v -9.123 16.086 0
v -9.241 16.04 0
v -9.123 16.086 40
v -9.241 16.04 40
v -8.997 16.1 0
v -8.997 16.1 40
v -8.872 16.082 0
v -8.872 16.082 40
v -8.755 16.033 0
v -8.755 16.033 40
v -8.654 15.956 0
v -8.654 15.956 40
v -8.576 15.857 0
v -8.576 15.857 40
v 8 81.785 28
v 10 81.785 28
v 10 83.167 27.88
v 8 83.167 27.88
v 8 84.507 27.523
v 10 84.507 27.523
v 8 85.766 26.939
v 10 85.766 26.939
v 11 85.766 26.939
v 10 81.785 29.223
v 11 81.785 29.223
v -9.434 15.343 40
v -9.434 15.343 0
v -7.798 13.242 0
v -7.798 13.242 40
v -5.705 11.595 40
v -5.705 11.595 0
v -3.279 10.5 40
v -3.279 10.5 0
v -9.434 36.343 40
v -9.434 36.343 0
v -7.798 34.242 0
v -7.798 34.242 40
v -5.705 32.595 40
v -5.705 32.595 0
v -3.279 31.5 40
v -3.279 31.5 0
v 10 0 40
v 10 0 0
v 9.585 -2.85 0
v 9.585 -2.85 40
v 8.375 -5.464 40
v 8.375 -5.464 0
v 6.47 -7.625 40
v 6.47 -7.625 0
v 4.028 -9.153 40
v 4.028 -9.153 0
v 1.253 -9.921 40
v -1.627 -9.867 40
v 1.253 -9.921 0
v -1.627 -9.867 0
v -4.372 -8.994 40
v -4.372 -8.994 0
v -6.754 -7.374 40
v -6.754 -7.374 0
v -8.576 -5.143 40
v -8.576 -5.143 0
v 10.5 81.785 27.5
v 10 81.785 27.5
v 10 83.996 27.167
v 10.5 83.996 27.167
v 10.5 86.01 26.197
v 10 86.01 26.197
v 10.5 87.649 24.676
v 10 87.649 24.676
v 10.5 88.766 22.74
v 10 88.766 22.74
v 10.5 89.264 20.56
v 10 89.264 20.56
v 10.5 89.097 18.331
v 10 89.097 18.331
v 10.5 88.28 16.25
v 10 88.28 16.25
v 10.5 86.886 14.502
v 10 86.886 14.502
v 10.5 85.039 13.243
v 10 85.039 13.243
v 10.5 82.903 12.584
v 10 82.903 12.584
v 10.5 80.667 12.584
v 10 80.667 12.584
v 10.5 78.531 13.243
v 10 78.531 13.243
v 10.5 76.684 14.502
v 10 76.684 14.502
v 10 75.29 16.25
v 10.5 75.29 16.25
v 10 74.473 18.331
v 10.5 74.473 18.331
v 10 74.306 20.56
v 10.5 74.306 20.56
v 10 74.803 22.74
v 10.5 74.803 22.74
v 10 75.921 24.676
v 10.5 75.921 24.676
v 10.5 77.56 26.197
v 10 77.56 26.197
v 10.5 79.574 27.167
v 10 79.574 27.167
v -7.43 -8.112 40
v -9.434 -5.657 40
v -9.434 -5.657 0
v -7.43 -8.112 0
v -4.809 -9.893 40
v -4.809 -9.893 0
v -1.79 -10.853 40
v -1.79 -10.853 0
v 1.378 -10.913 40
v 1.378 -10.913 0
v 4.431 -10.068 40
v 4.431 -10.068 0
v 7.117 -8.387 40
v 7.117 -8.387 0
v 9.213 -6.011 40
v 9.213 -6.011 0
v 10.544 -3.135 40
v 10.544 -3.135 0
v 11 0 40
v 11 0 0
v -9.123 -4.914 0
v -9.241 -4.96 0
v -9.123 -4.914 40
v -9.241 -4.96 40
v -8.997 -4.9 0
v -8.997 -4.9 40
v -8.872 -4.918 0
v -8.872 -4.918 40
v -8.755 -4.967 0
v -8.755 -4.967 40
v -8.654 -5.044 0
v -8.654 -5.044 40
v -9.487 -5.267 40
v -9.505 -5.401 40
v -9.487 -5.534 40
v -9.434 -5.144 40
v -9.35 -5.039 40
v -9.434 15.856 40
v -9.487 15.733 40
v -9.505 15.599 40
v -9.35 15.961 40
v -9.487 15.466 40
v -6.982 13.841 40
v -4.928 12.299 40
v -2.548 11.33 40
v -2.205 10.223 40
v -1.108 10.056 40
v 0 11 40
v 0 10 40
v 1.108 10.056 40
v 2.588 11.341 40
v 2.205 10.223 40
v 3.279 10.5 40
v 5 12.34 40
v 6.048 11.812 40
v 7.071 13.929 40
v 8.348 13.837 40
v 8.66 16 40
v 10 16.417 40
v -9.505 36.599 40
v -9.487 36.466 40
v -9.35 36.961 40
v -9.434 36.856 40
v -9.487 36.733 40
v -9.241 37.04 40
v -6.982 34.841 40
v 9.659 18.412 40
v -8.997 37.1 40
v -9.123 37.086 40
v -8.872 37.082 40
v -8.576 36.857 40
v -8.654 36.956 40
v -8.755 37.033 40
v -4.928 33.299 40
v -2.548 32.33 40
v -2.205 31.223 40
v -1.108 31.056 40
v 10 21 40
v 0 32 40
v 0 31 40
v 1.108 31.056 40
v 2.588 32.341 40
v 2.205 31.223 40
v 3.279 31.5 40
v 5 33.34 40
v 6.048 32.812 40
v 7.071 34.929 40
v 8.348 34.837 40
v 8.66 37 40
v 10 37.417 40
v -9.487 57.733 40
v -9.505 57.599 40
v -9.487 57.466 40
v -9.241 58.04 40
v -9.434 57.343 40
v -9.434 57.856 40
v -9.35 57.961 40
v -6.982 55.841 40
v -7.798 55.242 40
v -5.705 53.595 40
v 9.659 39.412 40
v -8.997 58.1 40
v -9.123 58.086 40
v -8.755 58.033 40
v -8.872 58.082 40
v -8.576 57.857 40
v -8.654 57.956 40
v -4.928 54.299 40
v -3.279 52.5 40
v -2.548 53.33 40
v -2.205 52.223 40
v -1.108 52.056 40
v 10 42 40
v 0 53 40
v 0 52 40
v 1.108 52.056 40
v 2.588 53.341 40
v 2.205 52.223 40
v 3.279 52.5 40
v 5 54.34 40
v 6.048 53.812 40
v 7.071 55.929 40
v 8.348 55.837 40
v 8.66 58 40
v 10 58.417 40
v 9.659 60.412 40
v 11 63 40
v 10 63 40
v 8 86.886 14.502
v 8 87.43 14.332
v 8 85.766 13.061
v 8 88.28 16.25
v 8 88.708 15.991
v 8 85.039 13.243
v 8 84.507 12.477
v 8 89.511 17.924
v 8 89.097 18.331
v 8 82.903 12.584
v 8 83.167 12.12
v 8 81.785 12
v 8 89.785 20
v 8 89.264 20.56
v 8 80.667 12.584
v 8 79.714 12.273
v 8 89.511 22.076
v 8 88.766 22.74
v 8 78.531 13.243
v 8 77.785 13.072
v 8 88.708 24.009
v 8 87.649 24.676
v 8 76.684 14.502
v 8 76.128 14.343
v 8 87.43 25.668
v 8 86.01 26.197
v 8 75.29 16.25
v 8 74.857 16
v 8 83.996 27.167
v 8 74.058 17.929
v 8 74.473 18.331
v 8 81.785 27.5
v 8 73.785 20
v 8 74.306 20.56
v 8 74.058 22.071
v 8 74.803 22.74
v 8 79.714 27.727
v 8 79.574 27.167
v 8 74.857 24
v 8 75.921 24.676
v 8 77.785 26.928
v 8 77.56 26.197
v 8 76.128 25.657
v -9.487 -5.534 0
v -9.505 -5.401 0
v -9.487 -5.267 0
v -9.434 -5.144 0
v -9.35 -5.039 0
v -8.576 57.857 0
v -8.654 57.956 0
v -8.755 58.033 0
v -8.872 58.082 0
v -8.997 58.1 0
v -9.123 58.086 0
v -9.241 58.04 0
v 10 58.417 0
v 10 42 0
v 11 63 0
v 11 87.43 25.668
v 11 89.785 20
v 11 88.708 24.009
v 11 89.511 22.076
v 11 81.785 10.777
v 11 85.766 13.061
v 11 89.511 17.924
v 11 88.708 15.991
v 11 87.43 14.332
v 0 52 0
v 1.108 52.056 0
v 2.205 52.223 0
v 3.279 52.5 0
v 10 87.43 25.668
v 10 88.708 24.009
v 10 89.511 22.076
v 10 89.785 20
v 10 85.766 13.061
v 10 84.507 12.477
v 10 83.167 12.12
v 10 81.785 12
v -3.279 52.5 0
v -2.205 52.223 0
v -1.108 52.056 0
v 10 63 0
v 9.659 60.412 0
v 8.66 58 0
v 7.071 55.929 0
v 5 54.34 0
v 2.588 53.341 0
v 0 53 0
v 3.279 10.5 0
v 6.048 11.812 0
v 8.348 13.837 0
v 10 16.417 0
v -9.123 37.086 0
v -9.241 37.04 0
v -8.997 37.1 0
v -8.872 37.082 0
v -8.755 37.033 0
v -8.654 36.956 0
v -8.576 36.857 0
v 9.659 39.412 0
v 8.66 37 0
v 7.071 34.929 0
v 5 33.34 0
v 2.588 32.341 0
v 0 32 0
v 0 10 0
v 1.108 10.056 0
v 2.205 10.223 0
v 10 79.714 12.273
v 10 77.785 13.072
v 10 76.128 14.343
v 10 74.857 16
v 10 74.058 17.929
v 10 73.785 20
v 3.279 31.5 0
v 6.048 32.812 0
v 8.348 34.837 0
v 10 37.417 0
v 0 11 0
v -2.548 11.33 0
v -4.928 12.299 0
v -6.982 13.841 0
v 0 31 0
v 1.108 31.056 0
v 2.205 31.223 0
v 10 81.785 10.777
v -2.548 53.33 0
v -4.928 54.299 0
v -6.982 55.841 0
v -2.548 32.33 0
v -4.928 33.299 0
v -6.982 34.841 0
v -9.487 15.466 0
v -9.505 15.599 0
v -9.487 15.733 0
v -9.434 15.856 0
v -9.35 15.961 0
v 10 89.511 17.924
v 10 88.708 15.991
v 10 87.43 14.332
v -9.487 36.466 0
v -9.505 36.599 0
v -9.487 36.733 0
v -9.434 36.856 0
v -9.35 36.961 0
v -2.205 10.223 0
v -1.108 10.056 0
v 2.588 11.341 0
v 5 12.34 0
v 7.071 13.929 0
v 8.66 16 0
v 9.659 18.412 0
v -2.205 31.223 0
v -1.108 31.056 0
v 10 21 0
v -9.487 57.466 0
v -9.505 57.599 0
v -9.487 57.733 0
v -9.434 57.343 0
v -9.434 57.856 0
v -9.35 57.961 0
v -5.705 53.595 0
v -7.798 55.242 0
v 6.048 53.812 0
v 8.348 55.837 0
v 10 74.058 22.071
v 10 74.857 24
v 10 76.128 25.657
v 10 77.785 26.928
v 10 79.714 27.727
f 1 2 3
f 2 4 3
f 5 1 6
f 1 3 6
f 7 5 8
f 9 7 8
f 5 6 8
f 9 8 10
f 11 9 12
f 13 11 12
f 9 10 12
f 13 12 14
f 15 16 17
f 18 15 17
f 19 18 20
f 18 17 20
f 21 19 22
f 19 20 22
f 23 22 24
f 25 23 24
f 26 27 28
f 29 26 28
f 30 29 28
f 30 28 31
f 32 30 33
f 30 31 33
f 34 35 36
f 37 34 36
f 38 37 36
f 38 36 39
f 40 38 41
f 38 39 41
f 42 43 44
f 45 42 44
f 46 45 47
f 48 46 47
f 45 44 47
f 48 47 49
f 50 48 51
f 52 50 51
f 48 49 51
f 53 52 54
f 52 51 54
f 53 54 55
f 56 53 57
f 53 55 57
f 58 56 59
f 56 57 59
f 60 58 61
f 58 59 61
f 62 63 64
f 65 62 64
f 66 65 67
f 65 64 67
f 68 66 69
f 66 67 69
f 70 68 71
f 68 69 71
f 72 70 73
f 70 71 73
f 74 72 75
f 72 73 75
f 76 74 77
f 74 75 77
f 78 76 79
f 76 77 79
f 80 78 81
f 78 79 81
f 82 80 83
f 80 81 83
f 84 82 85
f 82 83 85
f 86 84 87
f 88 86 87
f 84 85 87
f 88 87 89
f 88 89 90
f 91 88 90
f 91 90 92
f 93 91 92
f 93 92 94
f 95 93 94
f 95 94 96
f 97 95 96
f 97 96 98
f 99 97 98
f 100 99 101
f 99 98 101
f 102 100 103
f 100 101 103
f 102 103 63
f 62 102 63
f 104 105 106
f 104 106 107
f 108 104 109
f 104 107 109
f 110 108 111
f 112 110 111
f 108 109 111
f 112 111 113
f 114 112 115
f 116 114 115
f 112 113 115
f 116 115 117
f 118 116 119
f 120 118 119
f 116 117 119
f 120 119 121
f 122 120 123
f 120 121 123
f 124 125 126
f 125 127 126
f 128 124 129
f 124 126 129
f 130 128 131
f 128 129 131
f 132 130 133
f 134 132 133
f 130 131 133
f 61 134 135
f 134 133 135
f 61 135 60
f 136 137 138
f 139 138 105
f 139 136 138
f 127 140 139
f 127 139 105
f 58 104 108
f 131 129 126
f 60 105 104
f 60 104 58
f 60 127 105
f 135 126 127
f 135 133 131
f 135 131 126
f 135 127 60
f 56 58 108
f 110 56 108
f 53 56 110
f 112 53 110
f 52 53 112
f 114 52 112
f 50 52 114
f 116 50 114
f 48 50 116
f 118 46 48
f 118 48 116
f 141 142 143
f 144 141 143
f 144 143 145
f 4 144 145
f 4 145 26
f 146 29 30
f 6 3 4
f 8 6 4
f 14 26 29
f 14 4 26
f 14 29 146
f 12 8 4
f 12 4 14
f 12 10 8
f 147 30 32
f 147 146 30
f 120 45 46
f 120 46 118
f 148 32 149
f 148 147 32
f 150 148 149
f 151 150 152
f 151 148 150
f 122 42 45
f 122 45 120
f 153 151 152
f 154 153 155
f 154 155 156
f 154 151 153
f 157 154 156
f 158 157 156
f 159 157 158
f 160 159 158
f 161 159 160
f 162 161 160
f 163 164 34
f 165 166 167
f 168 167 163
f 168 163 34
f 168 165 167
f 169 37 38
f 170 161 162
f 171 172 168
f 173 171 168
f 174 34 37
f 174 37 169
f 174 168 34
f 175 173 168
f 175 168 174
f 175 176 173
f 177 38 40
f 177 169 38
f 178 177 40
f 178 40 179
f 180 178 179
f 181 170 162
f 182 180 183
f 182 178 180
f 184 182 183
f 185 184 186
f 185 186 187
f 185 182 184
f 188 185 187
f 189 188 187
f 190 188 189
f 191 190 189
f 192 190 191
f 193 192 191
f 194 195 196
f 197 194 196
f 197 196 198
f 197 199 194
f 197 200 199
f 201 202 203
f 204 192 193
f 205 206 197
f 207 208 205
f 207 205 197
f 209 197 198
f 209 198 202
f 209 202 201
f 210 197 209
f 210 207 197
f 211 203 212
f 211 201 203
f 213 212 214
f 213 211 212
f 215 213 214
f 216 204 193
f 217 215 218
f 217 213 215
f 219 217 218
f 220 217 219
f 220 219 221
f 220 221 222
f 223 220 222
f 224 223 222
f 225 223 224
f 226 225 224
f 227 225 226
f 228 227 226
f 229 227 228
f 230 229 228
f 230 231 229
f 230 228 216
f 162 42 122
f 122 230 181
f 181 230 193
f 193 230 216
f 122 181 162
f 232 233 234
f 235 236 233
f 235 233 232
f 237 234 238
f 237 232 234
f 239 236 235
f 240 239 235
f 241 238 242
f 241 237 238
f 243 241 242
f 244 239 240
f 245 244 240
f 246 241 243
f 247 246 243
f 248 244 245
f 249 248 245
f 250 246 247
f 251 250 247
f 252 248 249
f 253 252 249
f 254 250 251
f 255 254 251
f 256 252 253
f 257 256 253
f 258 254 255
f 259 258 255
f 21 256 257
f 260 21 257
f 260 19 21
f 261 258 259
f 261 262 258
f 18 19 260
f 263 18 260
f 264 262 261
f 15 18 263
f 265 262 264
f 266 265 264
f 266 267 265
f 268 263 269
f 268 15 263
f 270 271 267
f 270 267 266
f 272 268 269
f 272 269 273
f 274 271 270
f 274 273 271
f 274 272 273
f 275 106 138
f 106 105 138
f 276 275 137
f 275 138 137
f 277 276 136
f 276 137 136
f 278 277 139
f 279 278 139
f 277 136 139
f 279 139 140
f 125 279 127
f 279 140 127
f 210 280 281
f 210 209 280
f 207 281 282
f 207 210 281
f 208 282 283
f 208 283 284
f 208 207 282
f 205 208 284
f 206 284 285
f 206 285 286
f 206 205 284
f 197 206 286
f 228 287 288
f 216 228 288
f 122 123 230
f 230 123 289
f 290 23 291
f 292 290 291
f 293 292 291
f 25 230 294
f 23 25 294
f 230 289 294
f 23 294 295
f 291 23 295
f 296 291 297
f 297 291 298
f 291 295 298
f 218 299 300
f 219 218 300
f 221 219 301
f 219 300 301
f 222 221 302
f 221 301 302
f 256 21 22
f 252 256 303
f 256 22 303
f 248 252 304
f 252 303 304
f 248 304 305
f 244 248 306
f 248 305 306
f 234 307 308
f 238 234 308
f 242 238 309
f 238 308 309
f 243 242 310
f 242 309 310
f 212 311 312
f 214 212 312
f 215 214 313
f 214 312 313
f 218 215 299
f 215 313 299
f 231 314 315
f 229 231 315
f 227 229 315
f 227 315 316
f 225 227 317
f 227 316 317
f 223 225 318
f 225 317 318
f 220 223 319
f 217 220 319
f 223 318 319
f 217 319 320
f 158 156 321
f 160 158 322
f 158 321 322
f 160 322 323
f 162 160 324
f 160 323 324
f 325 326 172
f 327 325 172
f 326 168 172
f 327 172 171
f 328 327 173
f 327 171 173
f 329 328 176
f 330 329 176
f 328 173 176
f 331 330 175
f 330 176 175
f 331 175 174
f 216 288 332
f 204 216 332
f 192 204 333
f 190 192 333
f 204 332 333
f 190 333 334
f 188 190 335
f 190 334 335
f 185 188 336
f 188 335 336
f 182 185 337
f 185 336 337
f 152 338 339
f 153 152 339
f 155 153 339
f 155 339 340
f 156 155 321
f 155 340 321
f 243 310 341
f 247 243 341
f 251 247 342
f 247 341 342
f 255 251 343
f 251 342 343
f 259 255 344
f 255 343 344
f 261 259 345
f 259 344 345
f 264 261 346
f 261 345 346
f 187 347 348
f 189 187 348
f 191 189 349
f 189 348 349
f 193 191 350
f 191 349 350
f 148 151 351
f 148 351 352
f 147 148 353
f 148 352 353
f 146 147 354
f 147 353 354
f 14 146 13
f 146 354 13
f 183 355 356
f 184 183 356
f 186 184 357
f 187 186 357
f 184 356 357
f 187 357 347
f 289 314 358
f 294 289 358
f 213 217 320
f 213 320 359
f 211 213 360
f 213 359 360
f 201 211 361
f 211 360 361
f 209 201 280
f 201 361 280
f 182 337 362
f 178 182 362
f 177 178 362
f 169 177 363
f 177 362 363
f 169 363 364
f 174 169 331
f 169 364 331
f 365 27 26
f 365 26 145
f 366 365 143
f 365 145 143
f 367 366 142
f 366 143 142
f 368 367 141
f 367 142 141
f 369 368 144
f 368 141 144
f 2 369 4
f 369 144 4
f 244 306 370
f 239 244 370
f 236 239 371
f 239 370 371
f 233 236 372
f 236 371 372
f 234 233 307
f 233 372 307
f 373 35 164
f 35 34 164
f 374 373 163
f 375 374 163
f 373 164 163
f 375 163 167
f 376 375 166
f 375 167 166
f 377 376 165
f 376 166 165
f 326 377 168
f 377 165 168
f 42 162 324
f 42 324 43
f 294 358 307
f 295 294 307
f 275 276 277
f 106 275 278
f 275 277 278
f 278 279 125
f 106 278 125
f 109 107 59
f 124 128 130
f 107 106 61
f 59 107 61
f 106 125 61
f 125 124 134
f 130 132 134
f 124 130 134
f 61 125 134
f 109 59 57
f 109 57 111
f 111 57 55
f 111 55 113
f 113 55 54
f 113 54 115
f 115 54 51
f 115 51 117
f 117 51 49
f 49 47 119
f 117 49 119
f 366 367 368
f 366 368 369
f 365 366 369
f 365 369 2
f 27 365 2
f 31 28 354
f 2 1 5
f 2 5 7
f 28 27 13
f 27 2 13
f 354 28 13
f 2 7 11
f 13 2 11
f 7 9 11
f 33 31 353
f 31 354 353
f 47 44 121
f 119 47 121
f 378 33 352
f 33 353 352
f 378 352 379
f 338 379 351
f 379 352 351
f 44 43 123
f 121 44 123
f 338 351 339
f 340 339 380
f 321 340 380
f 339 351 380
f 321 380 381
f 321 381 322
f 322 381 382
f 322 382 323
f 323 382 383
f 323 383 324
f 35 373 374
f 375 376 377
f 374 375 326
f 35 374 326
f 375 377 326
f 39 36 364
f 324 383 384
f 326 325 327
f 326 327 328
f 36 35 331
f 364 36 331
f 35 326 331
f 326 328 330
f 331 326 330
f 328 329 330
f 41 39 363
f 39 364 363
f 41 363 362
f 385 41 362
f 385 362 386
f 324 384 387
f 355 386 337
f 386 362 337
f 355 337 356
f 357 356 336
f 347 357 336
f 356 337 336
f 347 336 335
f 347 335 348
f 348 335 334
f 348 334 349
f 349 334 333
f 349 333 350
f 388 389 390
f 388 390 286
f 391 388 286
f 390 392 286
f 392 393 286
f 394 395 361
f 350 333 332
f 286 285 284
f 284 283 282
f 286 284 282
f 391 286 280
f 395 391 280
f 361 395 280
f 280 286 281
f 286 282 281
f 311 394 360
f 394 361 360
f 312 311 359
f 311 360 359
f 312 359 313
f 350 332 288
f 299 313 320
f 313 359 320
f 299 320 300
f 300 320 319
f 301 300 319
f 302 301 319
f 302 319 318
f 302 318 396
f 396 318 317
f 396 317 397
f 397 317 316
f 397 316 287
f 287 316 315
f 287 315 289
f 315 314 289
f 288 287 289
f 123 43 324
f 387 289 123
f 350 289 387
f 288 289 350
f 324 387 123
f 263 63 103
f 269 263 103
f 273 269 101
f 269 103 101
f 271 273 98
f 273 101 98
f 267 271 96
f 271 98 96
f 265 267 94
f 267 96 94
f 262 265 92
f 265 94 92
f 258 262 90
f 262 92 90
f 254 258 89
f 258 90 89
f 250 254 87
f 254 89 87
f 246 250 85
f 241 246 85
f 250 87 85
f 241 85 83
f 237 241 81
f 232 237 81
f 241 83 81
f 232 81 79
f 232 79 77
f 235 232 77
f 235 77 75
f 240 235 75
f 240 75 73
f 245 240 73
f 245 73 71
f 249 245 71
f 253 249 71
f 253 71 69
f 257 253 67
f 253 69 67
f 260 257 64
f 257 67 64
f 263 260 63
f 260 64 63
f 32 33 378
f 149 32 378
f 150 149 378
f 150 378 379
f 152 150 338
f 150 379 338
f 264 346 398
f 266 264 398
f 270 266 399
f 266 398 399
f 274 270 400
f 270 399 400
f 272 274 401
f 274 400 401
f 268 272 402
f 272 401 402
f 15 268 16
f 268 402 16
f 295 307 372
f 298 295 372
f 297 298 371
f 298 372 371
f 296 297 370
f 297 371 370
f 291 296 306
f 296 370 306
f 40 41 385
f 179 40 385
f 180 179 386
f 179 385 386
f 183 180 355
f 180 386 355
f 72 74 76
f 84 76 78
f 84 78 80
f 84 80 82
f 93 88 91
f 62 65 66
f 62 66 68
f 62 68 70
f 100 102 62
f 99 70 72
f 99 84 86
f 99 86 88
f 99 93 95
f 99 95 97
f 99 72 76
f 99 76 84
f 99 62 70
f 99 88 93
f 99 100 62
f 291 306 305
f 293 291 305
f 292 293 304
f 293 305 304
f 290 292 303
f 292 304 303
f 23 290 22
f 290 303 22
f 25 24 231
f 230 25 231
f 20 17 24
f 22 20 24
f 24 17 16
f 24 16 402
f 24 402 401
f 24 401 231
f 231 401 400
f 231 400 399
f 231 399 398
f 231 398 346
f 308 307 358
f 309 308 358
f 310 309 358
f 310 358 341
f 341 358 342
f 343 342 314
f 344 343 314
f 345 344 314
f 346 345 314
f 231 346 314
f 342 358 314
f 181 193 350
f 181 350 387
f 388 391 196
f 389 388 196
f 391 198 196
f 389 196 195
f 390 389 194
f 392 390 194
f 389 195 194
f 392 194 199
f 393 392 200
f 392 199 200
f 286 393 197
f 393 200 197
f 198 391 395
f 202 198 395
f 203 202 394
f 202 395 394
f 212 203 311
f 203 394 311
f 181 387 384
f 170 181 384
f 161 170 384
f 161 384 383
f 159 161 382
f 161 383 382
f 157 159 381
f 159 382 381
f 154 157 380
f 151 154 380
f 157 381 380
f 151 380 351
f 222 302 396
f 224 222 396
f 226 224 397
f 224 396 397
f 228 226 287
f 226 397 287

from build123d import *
from build123d import SkipClean  # not in build123d's __all__

# Parameters (mm, degrees)
F1_DEPTH = 40
F3_DEPTH = 1.001
F4_DEPTH = 2
F5_DEPTH = 0.5
F6_R     = 0.49999


# Not quite as in the source:
# - a fillet or chamfer is up to 0.001 mm smaller than in the source, because OpenCascade refuses the exact size


with BuildPart() as f1:
    # F0 (on Top) → F1 (new body)
    with BuildSketch(Plane.XY):
        with BuildLine():
            Line((11, 0), (10, 0))
            ThreePointArc((10, 0), (2.4380397486, -9.6982453147), (-8.8111924369, -4.7289415137))
            Line((-8.8111924369, -4.7289415137), (-9.6923116806, -5.2018356651))
            ThreePointArc((-9.6923116806, -5.2018356651), (2.6818437234, -10.6680698462), (11, 0))
        make_face()
        with BuildLine():
            Line((10, 4.582575695), (10, 0))
            Line((10, 0), (11, 0))
            ThreePointArc((11, 0), (10.7470926301, 2.3452078799), (10, 4.582575695))
        make_face()
        with BuildLine():
            Line((10, 16.417424305), (10, 4.582575695))
            ThreePointArc((10, 4.582575695), (10.7470926301, 2.3452078799), (11, 0))
            Line((11, 0), (11, 21))
            ThreePointArc((11, 21), (10.7470926301, 18.6547921201), (10, 16.417424305))
        make_face()
        with BuildLine():
            ThreePointArc((0, 11), (1.6583123952, 10.8742815855), (3.2787192622, 10.5))
            ThreePointArc((3.2787192622, 10.5), (7.2687738933, 12.743794692), (10, 16.417424305))
            Line((10, 16.417424305), (10, 21))
            ThreePointArc((10, 21), (7.0710678119, 13.9289321881), (0, 11))
        make_face()
        with BuildLine():
            ThreePointArc((-3.2787192622, 10.5), (-1.6583124171, 10.1257184179), (-4.44e-08, 10))
            ThreePointArc((-4.44e-08, 10), (1.6583123732, 10.1257184112), (3.2787192622, 10.5))
            ThreePointArc((3.2787192622, 10.5), (1.6583123952, 10.8742815855), (0, 11))
            ThreePointArc((0, 11), (-1.6583123952, 10.8742815855), (-3.2787192622, 10.5))
        make_face()
        with BuildLine():
            ThreePointArc((-9.6923116806, 15.7981643349), (-7.0056796429, 12.5194072884), (-3.2787192622, 10.5))
            ThreePointArc((-3.2787192622, 10.5), (-1.6583123952, 10.8742815855), (0, 11))
            ThreePointArc((0, 11), (-5.1337405886, 12.4183505333), (-8.8111924369, 16.2710584863))
            Line((-8.8111924369, 16.2710584863), (-9.6923116806, 15.7981643349))
        make_face()
        with BuildLine():
            Line((10, 21), (10, 16.417424305))
            ThreePointArc((10, 16.417424305), (10.7470926301, 18.6547921201), (11, 21))
            ThreePointArc((11, 21), (10.7470926301, 23.3452078799), (10, 25.582575695))
            Line((10, 25.582575695), (10, 21))
        make_face()
        with BuildLine():
            ThreePointArc((10, 25.582575695), (10.7470926301, 23.3452078799), (11, 21))
            Line((11, 21), (11, 42))
            ThreePointArc((11, 42), (10.7470926301, 39.6547921201), (10, 37.417424305))
            Line((10, 37.417424305), (10, 25.582575695))
        make_face()
        with BuildLine():
            ThreePointArc((5.81e-08, 32), (1.6583124239, 31.8742815811), (3.2787192622, 31.5))
            ThreePointArc((3.2787192622, 31.5), (7.2687738933, 33.743794692), (10, 37.417424305))
            Line((10, 37.417424305), (10, 42))
            ThreePointArc((10, 42), (7.0710678324, 34.9289322087), (5.81e-08, 32))
        make_face()
        with BuildLine():
            ThreePointArc((5.81e-08, 32), (-1.6583123665, 31.8742815898), (-3.2787192622, 31.5))
            ThreePointArc((-3.2787192622, 31.5), (-1.658312379, 31.1257184121), (3.28e-08, 31))
            ThreePointArc((3.28e-08, 31), (1.6583124114, 31.125718417), (3.2787192622, 31.5))
            ThreePointArc((3.2787192622, 31.5), (1.6583124239, 31.8742815811), (5.81e-08, 32))
        make_face()
        with BuildLine():
            ThreePointArc((-9.6923116806, 36.7981643349), (-7.0056796429, 33.5194072884), (-3.2787192622, 31.5))
            ThreePointArc((-3.2787192622, 31.5), (-1.6583123665, 31.8742815898), (5.81e-08, 32))
            ThreePointArc((5.81e-08, 32), (-5.1337405637, 33.4183505184), (-8.8111924369, 37.2710584863))
            Line((-8.8111924369, 37.2710584863), (-9.6923116806, 36.7981643349))
        make_face()
        with BuildLine():
            ThreePointArc((10, 37.417424305), (10.7470926301, 39.6547921201), (11, 42))
            ThreePointArc((11, 42), (10.7470926301, 44.3452078799), (10, 46.582575695))
            Line((10, 46.582575695), (10, 42))
            Line((10, 42), (10, 37.417424305))
        make_face()
        with BuildLine():
            ThreePointArc((10, 46.582575695), (10.7470926301, 44.3452078799), (11, 42))
            Line((11, 42), (11, 63))
            ThreePointArc((11, 63), (10.7470926301, 60.6547921201), (10, 58.417424305))
            Line((10, 58.417424305), (10, 46.582575695))
        make_face()
        with BuildLine():
            ThreePointArc((10, 58.417424305), (10.7470926301, 60.6547921201), (11, 63))
            ThreePointArc((11, 63), (10.8000300748, 65.0879057409), (10.2073908395, 67.0998990536))
            Line((10.2073908395, 67.0998990536), (10, 67.0998990536))
            Line((10, 67.0998990536), (10, 63))
            Line((10, 63), (10, 58.417424305))
        make_face()
        with BuildLine():
            ThreePointArc((0, 53), (1.6583123952, 52.8742815855), (3.2787192622, 52.5))
            ThreePointArc((3.2787192622, 52.5), (7.2687738933, 54.743794692), (10, 58.417424305))
            Line((10, 58.417424305), (10, 63))
            ThreePointArc((10, 63), (7.0710678119, 55.9289321881), (0, 53))
        make_face()
        with BuildLine():
            ThreePointArc((-5.66e-08, 52), (1.6583123672, 52.1257184103), (3.2787192622, 52.5))
            ThreePointArc((3.2787192622, 52.5), (1.6583123952, 52.8742815855), (0, 53))
            ThreePointArc((0, 53), (-1.6583123952, 52.8742815855), (-3.2787192622, 52.5))
            ThreePointArc((-3.2787192622, 52.5), (-1.6583124232, 52.1257184188), (-5.66e-08, 52))
        make_face()
        with BuildLine():
            ThreePointArc((-9.6923116806, 57.7981643349), (-7.0056796429, 54.5194072884), (-3.2787192622, 52.5))
            ThreePointArc((-3.2787192622, 52.5), (-1.6583123952, 52.8742815855), (0, 53))
            ThreePointArc((0, 53), (-5.1337405886, 54.4183505333), (-8.8111924369, 58.2710584863))
            Line((-8.8111924369, 58.2710584863), (-9.6923116806, 57.7981643349))
        make_face()
        with BuildLine():
            ThreePointArc((10, 67.582575695), (10.1065773297, 67.3424756395), (10.2073908395, 67.0998990536))
            Line((10.2073908395, 67.0998990536), (11, 67.0998990536))
            Line((11, 67.0998990536), (11, 89.784912765))
            Line((11, 89.784912765), (10, 89.784912765))
            Line((10, 89.784912765), (10, 67.582575695))
        make_face()
        with BuildLine():
            ThreePointArc((10.2073908395, 67.0998990536), (10.8000300748, 65.0879057409), (11, 63))
            Line((11, 63), (11, 67.0998990536))
            Line((11, 67.0998990536), (10.2073908395, 67.0998990536))
        make_face()
        with BuildLine():
            Line((10, 67.0998990536), (10.2073908395, 67.0998990536))
            ThreePointArc((10.2073908395, 67.0998990536), (10.1065773297, 67.3424756395), (10, 67.582575695))
            Line((10, 67.582575695), (10, 67.0998990536))
        make_face()
    extrude(amount=F1_DEPTH)

    # F2 (on face) → F3 (cut, through all)
    with BuildSketch(Plane(origin=(10, 0, 0), x_dir=(0, -1, 0), z_dir=(-1, 0, 0))):
        Polygon((-81.784912765, 10.7769520171), (-81.784912765, 0), (-63, 0), align=None)
        with BuildLine():
            Line((-89.784912765, 0), (-81.784912765, 0))
            Line((-81.784912765, 0), (-81.784912765, 10.7769520171))
            Line((-81.784912765, 10.7769520171), (-85.7659138368, 13.0608624119))
            ThreePointArc((-85.7659138368, 13.0608624119), (-88.7076293046, 15.9905117892), (-89.784912765, 20))
            Line((-89.784912765, 20), (-89.784912765, 0))
        make_face()
        with BuildLine():
            Line((-89.784912765, 40), (-89.784912765, 20))
            ThreePointArc((-89.784912765, 20), (-88.7076292465, 24.0094883112), (-85.7659136356, 26.9391377035))
            Line((-85.7659136356, 26.9391377035), (-81.784912765, 29.2230479829))
            Line((-81.784912765, 29.2230479829), (-81.784912765, 40))
            Line((-81.784912765, 40), (-89.784912765, 40))
        make_face()
        Polygon((-81.784912765, 29.2230479829), (-63, 40), (-81.784912765, 40), align=None)
    extrude(amount=-F3_DEPTH, mode=Mode.SUBTRACT)

    # F2 (on face) → F4 (join)
    with BuildSketch(Plane(origin=(10, 0, 0), x_dir=(0, -1, 0), z_dir=(-1, 0, 0))):
        with BuildLine():
            ThreePointArc((-85.7659138368, 13.0608624119), (-83.8448762714, 12.2697638877), (-81.784912765, 12))
            Line((-81.784912765, 12), (-81.784912765, 12.5))
            ThreePointArc((-81.784912765, 12.5), (-89.284912765, 20), (-81.784912765, 27.5))
            Line((-81.784912765, 27.5), (-81.784912765, 28))
            ThreePointArc((-81.784912765, 28), (-83.8448761593, 27.7302361422), (-85.7659136356, 26.9391377035))
            ThreePointArc((-85.7659136356, 26.9391377035), (-88.7076292465, 24.0094883112), (-89.784912765, 20))
            ThreePointArc((-89.784912765, 20), (-88.7076293046, 15.9905117892), (-85.7659138368, 13.0608624119))
        make_face()
        with BuildLine():
            Line((-81.784912765, 12.5), (-81.784912765, 12))
            ThreePointArc((-81.784912765, 12), (-76.1280585155, 14.3431457505), (-73.784912765, 20))
            ThreePointArc((-73.784912765, 20), (-76.1280585155, 25.6568542495), (-81.784912765, 28))
            Line((-81.784912765, 28), (-81.784912765, 27.5))
            ThreePointArc((-81.784912765, 27.5), (-76.4816119061, 25.3033008589), (-74.284912765, 20))
            ThreePointArc((-74.284912765, 20), (-76.4816119061, 14.6966991411), (-81.784912765, 12.5))
        make_face()
    with SkipClean():  # cleaning this boolean's faces spoils the solid; the shape is the same uncleaned
        extrude(amount=F4_DEPTH)

    # F2 (on face) → F5 (cut)
    with BuildSketch(Plane(origin=(10, 0, 0), x_dir=(0, -1, 0), z_dir=(-1, 0, 0))):
        with BuildLine():
            Line((-81.784912765, 27.5), (-81.784912765, 12.5))
            ThreePointArc((-81.784912765, 12.5), (-76.4816119061, 14.6966991411), (-74.284912765, 20))
            ThreePointArc((-74.284912765, 20), (-76.4816119061, 25.3033008589), (-81.784912765, 27.5))
        make_face()
        with BuildLine():
            ThreePointArc((-81.784912765, 27.5), (-89.284912765, 20), (-81.784912765, 12.5))
            Line((-81.784912765, 12.5), (-81.784912765, 27.5))
        make_face()
    with SkipClean():  # cleaning this boolean's faces spoils the solid; the shape is the same uncleaned
        extrude(amount=-F5_DEPTH, mode=Mode.SUBTRACT)

    # F6 (radius 0.5 in the source; OpenCascade refuses exactly that, so slightly less here)
    f6_edges = [f1.edges().sort_by_distance(p)[0] for p in [
        (-8.811192, 58.271058, 20),
        (-9.692312, 57.798164, 20),
        (-8.811192, 37.271058, 20),
        (-9.692312, 36.798164, 20),
        (-8.811192, 16.271058, 20),
        (-9.692312, 15.798164, 20),
        (-8.811192, -4.728942, 20),
        (-9.692312, -5.201836, 20),
    ]]
    fillet(f6_edges, radius=F6_R)


solid = f1.part
